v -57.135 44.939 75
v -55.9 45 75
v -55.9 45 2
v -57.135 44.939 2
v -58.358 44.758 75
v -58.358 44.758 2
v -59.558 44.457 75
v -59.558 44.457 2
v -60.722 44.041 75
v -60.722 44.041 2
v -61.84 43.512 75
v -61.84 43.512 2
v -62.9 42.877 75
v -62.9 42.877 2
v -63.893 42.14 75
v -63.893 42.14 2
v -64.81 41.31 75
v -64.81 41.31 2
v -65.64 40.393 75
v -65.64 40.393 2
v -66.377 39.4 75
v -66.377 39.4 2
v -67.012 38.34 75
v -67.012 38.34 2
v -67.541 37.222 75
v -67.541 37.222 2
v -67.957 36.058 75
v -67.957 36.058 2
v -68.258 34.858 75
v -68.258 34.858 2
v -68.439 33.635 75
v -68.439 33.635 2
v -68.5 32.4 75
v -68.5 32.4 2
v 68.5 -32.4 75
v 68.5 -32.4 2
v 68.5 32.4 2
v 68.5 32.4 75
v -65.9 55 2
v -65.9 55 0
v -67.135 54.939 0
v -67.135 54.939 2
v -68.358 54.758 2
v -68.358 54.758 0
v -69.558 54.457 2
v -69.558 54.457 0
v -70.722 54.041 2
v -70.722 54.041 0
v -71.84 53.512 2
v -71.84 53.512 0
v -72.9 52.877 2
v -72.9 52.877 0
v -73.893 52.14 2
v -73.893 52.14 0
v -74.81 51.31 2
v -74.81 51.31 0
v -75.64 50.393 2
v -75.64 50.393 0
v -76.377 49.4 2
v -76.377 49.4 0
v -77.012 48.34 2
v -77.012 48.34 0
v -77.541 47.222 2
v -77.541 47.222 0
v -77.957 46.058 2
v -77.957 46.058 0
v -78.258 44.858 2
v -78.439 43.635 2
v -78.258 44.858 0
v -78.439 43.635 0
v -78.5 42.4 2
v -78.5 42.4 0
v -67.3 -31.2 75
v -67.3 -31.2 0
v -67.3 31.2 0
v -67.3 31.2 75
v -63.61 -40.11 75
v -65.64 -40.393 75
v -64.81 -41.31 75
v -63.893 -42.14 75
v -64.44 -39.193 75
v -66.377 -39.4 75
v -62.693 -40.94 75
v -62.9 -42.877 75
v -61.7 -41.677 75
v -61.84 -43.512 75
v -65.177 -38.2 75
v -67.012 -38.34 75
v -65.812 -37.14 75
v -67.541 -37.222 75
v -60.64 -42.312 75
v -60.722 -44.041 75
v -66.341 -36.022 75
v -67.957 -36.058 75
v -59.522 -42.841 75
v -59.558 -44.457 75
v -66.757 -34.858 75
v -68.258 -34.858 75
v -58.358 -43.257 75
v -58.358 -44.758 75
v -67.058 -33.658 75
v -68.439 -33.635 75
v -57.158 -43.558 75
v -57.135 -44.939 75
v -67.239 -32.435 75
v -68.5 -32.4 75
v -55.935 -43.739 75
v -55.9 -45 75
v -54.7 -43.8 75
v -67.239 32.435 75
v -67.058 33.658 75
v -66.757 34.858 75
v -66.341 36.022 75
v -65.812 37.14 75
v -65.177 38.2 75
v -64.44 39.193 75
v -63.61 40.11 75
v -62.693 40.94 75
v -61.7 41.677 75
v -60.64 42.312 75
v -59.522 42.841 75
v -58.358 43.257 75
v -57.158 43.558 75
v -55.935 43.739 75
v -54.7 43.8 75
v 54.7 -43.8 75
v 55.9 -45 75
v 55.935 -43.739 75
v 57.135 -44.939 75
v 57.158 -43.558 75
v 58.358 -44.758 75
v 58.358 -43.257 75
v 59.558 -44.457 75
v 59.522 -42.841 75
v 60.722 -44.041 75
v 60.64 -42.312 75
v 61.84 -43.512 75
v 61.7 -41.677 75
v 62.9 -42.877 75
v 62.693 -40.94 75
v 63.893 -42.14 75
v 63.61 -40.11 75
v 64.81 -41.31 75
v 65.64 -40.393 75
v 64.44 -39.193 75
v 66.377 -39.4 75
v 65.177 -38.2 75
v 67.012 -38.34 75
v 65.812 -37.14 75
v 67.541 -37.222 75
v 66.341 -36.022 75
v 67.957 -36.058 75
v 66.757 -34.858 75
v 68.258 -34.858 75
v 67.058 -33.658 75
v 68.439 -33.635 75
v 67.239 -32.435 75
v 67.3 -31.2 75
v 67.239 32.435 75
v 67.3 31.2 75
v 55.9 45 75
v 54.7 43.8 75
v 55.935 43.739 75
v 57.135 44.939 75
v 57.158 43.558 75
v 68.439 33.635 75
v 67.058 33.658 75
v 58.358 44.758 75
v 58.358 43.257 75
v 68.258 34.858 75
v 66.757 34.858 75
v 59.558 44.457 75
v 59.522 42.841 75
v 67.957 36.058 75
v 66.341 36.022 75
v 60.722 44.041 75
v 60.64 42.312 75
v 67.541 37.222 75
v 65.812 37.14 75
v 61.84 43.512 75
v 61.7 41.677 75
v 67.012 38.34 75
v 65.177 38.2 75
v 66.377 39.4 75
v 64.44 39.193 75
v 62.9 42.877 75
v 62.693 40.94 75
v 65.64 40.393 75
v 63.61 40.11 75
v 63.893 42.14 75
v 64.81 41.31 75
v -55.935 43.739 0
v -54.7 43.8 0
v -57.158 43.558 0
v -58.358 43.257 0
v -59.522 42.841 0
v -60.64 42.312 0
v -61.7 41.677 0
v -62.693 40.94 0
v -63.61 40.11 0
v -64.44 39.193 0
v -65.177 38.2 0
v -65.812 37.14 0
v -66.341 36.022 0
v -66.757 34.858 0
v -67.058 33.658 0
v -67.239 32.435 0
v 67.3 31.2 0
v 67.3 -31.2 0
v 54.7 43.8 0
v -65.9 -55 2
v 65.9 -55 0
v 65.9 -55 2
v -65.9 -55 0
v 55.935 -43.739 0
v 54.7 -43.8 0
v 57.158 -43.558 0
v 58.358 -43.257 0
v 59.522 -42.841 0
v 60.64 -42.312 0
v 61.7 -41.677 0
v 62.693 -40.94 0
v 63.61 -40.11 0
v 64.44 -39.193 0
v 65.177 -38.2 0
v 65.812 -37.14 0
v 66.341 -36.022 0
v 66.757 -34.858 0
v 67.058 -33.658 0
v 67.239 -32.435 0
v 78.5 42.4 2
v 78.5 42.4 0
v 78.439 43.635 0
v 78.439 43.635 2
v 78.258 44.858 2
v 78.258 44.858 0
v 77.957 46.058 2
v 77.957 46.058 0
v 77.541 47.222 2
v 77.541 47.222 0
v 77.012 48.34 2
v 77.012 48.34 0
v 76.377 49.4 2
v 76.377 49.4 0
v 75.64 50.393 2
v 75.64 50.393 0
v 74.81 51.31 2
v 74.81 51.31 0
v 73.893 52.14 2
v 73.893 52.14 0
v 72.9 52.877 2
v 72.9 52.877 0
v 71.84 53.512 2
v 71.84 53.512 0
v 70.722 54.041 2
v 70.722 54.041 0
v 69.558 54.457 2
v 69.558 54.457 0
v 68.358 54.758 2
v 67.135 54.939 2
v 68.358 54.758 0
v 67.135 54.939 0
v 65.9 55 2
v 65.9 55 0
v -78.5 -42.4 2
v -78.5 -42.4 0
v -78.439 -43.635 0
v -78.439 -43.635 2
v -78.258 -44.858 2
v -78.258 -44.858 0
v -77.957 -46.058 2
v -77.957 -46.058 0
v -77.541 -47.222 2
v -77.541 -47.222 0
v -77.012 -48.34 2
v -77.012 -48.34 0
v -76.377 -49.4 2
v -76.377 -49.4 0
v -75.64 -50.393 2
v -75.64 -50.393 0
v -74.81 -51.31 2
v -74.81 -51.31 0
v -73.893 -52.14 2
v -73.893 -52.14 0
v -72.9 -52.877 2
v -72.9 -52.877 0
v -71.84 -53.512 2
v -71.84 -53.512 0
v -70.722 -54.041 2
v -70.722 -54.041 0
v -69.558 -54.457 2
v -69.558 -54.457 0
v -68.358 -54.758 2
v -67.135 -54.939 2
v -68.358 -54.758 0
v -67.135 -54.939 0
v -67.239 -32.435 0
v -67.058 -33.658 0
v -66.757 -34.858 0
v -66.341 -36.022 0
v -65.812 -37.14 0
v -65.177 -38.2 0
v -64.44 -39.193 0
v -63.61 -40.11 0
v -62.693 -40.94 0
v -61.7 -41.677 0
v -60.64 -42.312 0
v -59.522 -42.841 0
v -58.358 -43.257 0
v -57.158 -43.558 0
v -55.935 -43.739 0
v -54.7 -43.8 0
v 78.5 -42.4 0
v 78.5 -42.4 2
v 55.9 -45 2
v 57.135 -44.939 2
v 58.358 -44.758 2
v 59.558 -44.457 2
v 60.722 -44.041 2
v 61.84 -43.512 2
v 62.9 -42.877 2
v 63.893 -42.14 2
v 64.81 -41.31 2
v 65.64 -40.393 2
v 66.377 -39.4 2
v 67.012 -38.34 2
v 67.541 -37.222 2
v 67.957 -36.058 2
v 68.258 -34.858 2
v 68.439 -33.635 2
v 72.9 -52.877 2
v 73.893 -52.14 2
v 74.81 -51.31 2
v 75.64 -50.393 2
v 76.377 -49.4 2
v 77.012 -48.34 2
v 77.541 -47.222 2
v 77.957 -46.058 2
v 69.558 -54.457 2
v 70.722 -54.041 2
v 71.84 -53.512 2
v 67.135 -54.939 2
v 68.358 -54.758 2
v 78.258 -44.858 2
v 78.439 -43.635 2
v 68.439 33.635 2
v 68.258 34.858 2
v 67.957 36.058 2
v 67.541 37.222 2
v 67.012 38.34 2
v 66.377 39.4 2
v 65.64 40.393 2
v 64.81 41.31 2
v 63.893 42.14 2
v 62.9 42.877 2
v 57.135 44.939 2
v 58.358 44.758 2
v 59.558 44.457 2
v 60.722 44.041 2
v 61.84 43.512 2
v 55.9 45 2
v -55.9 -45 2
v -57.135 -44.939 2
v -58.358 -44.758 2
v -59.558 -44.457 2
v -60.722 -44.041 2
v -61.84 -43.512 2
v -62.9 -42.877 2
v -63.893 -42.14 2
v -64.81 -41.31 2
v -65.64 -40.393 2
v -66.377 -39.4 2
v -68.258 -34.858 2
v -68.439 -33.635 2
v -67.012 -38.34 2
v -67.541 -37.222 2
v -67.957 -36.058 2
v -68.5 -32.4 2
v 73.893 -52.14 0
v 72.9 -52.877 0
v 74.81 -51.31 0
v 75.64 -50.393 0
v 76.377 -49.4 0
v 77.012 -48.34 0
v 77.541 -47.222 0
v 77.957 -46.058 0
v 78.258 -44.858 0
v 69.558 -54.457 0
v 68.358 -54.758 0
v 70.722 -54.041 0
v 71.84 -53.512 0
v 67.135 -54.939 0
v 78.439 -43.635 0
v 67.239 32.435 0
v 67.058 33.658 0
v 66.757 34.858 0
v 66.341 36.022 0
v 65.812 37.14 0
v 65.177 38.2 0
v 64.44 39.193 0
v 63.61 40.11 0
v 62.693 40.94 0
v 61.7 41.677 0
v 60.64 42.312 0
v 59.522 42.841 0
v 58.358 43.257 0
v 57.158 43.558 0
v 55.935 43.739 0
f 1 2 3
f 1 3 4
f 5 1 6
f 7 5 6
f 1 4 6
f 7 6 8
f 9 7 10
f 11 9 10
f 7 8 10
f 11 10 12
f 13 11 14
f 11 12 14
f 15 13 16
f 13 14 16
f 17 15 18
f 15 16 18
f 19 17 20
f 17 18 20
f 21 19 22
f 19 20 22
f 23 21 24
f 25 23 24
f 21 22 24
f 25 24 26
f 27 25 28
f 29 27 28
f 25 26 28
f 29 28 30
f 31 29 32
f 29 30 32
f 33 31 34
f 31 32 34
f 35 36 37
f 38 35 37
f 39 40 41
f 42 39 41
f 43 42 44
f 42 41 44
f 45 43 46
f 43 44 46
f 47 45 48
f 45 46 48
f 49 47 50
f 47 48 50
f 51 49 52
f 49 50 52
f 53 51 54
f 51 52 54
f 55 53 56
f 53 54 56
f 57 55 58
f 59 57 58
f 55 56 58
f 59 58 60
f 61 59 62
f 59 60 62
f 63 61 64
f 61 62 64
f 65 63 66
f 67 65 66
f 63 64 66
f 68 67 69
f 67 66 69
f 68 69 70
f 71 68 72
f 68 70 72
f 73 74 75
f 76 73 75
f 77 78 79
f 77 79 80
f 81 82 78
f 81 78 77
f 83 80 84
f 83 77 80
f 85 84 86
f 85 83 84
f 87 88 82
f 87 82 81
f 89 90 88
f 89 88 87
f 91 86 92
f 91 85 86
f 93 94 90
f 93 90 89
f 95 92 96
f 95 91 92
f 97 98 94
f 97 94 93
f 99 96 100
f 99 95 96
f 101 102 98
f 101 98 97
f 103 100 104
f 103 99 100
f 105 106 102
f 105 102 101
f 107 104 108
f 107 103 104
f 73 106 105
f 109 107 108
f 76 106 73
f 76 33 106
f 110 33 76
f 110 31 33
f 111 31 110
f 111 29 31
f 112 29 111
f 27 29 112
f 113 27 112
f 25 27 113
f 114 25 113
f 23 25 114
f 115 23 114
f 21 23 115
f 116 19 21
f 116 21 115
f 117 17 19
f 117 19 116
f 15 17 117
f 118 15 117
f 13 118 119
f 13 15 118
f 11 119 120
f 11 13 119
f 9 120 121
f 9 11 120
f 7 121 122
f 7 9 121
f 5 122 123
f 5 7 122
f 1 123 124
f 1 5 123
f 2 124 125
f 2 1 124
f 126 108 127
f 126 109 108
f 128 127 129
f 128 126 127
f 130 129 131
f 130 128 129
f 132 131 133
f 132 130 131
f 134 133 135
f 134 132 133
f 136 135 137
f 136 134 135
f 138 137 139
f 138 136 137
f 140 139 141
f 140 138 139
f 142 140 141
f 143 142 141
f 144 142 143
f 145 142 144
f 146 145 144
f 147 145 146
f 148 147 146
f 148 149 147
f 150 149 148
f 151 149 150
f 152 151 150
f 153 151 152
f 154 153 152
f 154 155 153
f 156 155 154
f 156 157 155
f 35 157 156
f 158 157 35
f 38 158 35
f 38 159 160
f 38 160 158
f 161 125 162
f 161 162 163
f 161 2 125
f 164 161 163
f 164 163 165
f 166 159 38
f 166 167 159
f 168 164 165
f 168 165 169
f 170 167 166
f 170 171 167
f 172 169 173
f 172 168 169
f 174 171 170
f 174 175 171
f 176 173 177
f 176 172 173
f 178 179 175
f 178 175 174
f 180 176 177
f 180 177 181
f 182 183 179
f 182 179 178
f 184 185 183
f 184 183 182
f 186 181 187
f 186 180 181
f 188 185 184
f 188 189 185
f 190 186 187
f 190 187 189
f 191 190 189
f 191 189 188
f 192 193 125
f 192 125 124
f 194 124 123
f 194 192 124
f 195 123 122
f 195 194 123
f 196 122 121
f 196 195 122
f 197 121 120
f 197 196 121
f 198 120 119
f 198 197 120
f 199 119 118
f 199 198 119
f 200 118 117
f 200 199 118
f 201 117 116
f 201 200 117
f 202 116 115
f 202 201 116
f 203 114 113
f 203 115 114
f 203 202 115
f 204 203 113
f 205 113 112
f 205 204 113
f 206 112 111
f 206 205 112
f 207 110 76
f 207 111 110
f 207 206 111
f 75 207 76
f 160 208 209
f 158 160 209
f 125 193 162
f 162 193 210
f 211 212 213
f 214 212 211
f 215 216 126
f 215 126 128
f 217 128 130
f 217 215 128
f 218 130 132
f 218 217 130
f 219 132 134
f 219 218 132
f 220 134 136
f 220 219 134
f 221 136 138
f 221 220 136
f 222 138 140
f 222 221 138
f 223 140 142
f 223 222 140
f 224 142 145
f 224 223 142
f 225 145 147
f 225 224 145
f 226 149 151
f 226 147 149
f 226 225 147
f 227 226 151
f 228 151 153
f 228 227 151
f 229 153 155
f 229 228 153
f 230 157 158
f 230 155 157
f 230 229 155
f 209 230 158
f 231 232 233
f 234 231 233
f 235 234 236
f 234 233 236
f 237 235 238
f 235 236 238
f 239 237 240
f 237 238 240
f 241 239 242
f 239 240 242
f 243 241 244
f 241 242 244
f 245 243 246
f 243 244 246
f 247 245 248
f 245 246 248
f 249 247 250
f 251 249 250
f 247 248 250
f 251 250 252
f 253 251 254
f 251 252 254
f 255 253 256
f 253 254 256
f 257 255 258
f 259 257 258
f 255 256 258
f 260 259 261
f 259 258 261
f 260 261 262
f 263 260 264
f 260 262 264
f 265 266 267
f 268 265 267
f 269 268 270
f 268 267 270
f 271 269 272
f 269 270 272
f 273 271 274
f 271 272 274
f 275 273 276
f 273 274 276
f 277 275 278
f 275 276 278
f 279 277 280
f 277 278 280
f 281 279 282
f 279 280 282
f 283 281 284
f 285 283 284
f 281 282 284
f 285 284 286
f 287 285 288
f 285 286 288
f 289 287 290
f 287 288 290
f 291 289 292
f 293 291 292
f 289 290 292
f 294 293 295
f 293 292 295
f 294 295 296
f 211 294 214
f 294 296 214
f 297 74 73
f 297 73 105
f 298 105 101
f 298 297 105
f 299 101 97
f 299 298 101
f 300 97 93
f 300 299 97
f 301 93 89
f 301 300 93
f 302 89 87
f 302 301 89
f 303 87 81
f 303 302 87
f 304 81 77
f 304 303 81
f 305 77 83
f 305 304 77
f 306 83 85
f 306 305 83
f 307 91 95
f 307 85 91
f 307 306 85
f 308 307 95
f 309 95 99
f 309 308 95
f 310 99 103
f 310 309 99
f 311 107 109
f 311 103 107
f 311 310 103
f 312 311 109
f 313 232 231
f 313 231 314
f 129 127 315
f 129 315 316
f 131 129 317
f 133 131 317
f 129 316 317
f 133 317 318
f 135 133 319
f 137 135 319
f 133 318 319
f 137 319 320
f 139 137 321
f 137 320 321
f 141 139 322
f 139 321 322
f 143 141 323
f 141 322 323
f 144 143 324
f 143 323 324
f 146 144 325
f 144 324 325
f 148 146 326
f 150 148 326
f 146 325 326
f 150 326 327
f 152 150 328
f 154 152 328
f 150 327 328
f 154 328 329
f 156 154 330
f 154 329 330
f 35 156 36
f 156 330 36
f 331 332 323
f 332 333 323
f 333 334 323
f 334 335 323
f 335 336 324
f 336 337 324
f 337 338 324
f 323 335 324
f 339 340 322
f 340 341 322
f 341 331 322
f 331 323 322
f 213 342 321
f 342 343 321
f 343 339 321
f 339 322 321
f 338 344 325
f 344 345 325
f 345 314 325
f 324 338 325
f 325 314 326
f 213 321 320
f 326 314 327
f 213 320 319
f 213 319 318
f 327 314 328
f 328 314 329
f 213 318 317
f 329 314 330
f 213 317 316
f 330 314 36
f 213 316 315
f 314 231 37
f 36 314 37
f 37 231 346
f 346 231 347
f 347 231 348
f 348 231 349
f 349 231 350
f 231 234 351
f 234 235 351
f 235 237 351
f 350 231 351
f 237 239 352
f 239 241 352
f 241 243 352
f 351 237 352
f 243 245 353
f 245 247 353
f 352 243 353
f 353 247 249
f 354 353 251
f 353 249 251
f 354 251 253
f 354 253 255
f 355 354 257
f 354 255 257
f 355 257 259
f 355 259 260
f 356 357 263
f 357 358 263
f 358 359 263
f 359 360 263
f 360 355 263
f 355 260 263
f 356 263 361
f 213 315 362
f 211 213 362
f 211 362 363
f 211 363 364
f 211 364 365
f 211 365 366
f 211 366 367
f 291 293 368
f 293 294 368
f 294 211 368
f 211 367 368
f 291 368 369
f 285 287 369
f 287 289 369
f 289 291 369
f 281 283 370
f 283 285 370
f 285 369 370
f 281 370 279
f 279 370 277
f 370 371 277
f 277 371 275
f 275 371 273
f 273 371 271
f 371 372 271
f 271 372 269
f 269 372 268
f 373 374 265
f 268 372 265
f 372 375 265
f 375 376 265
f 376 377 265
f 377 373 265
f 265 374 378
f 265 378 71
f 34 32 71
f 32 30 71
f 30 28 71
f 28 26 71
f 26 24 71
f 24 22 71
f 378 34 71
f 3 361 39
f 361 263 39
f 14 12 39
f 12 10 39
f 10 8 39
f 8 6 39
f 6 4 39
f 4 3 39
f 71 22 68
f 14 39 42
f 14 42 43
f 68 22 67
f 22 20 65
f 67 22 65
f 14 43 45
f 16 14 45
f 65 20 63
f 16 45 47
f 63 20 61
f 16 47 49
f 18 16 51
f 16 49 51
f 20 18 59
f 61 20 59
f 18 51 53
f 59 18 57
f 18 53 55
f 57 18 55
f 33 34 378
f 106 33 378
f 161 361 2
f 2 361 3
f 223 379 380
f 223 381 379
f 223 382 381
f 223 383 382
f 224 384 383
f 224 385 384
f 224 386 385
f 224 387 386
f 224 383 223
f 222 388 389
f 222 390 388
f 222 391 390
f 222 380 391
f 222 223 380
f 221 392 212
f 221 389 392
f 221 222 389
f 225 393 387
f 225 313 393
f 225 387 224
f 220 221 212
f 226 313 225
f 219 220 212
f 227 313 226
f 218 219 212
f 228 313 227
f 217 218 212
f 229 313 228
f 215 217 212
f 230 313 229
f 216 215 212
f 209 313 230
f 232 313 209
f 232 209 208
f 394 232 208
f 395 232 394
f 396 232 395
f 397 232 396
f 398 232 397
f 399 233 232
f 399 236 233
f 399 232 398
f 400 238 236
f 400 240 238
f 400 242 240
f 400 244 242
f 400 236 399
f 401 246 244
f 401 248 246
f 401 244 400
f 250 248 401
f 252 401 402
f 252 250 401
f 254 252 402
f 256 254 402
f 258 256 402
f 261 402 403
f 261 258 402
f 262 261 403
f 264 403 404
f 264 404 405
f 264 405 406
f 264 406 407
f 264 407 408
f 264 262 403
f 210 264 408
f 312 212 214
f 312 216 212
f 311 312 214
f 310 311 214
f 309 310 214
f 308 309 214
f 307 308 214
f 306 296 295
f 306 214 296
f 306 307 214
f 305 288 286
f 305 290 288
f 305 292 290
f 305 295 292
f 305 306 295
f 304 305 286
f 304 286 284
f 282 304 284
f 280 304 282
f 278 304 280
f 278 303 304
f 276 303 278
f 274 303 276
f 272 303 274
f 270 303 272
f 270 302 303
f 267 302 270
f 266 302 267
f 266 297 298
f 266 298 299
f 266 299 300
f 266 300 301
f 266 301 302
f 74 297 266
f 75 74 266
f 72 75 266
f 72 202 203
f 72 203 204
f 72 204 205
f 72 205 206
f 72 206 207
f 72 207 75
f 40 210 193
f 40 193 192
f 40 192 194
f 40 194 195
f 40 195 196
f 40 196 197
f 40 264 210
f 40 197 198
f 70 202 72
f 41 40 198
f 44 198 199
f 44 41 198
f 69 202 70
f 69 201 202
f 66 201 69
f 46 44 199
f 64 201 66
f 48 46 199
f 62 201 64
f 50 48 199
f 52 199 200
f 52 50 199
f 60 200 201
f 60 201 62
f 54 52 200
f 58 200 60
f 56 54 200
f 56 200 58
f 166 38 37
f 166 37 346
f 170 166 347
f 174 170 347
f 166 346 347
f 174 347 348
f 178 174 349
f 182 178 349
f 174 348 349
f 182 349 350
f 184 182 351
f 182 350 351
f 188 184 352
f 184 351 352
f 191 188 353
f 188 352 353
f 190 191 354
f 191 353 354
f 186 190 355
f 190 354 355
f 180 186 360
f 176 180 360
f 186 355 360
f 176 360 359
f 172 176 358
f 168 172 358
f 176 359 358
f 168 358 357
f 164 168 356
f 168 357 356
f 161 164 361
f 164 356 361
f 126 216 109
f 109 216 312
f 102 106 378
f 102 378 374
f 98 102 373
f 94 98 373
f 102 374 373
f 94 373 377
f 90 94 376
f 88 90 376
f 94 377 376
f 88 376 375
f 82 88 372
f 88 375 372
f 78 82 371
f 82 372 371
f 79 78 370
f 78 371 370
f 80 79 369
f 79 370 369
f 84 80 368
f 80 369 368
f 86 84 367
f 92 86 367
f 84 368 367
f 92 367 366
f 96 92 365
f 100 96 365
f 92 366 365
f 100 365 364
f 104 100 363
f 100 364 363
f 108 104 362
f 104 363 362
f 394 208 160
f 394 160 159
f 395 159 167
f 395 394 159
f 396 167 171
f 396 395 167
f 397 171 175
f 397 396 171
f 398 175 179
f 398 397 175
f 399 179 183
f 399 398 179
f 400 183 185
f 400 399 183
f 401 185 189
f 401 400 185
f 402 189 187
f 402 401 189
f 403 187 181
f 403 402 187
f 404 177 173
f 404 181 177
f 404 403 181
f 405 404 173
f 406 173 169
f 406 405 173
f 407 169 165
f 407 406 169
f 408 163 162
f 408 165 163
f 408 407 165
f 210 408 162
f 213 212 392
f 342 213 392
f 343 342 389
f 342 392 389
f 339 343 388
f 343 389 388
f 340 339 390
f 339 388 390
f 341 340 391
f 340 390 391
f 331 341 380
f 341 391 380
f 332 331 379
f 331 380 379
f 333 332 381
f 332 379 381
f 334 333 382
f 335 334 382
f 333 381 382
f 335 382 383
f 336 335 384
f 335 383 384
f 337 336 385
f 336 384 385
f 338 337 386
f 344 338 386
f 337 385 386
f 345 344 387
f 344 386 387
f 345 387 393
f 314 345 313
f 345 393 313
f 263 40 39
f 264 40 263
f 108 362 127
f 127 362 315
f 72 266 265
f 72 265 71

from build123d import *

# Parameters (mm, degrees)
PAD_DEPTH    = 75
PAD005_DEPTH = 2
POCKET_DEPTH = 75.001


with BuildPart() as part:
    # Sketch → Pad (new body)
    with BuildSketch(Plane.XY):
        with BuildLine():
            Line((55.9, 45), (-55.9, 45))
            ThreePointArc((-55.9, 45), (-64.809545, 41.309545), (-68.5, 32.4))
            Line((-68.5, 32.4), (-68.5, -32.4))
            ThreePointArc((-68.5, -32.4), (-64.809545, -41.309545), (-55.9, -45))
            Line((-55.9, -45), (55.9, -45))
            ThreePointArc((55.9, -45), (64.809545, -41.309545), (68.5, -32.4))
            Line((68.5, -32.4), (68.5, 32.4))
            ThreePointArc((68.5, 32.4), (64.809545, 41.309545), (55.9, 45))
        make_face()
    extrude(amount=PAD_DEPTH)

    # Sketch006 → Pad005 (join)
    with BuildSketch(Plane.XY):
        with BuildLine():
            Line((-65.9, 55), (65.9, 55))
            ThreePointArc((78.5, 42.4), (74.809545, 51.309545), (65.9, 55))
            Line((78.5, 42.4), (78.5, -42.4))
            ThreePointArc((65.9, -55), (74.809545, -51.309545), (78.5, -42.4))
            Line((65.9, -55), (-65.9, -55))
            ThreePointArc((-78.5, -42.4), (-74.809545, -51.309545), (-65.9, -55))
            Line((-78.5, -42.4), (-78.5, 42.4))
            ThreePointArc((-65.9, 55), (-74.809545, 51.309545), (-78.5, 42.4))
        make_face()
    extrude(amount=PAD005_DEPTH)

    # Sketch007 → Pocket (cut, through all)
    with BuildSketch(Plane.XY):
        with BuildLine():
            Line((-54.7, 43.8), (54.7, 43.8))
            ThreePointArc((67.3, 31.2), (63.609545, 40.109545), (54.7, 43.8))
            Line((67.3, 31.2), (67.3, -31.2))
            ThreePointArc((54.7, -43.8), (63.609545, -40.109545), (67.3, -31.2))
            Line((54.7, -43.8), (-54.7, -43.8))
            ThreePointArc((-67.3, -31.2), (-63.609545, -40.109545), (-54.7, -43.8))
            Line((-67.3, -31.2), (-67.3, 31.2))
            ThreePointArc((-54.7, 43.8), (-63.609545, 40.109545), (-67.3, 31.2))
        make_face()
    extrude(amount=POCKET_DEPTH, mode=Mode.SUBTRACT)


solid = part.part
